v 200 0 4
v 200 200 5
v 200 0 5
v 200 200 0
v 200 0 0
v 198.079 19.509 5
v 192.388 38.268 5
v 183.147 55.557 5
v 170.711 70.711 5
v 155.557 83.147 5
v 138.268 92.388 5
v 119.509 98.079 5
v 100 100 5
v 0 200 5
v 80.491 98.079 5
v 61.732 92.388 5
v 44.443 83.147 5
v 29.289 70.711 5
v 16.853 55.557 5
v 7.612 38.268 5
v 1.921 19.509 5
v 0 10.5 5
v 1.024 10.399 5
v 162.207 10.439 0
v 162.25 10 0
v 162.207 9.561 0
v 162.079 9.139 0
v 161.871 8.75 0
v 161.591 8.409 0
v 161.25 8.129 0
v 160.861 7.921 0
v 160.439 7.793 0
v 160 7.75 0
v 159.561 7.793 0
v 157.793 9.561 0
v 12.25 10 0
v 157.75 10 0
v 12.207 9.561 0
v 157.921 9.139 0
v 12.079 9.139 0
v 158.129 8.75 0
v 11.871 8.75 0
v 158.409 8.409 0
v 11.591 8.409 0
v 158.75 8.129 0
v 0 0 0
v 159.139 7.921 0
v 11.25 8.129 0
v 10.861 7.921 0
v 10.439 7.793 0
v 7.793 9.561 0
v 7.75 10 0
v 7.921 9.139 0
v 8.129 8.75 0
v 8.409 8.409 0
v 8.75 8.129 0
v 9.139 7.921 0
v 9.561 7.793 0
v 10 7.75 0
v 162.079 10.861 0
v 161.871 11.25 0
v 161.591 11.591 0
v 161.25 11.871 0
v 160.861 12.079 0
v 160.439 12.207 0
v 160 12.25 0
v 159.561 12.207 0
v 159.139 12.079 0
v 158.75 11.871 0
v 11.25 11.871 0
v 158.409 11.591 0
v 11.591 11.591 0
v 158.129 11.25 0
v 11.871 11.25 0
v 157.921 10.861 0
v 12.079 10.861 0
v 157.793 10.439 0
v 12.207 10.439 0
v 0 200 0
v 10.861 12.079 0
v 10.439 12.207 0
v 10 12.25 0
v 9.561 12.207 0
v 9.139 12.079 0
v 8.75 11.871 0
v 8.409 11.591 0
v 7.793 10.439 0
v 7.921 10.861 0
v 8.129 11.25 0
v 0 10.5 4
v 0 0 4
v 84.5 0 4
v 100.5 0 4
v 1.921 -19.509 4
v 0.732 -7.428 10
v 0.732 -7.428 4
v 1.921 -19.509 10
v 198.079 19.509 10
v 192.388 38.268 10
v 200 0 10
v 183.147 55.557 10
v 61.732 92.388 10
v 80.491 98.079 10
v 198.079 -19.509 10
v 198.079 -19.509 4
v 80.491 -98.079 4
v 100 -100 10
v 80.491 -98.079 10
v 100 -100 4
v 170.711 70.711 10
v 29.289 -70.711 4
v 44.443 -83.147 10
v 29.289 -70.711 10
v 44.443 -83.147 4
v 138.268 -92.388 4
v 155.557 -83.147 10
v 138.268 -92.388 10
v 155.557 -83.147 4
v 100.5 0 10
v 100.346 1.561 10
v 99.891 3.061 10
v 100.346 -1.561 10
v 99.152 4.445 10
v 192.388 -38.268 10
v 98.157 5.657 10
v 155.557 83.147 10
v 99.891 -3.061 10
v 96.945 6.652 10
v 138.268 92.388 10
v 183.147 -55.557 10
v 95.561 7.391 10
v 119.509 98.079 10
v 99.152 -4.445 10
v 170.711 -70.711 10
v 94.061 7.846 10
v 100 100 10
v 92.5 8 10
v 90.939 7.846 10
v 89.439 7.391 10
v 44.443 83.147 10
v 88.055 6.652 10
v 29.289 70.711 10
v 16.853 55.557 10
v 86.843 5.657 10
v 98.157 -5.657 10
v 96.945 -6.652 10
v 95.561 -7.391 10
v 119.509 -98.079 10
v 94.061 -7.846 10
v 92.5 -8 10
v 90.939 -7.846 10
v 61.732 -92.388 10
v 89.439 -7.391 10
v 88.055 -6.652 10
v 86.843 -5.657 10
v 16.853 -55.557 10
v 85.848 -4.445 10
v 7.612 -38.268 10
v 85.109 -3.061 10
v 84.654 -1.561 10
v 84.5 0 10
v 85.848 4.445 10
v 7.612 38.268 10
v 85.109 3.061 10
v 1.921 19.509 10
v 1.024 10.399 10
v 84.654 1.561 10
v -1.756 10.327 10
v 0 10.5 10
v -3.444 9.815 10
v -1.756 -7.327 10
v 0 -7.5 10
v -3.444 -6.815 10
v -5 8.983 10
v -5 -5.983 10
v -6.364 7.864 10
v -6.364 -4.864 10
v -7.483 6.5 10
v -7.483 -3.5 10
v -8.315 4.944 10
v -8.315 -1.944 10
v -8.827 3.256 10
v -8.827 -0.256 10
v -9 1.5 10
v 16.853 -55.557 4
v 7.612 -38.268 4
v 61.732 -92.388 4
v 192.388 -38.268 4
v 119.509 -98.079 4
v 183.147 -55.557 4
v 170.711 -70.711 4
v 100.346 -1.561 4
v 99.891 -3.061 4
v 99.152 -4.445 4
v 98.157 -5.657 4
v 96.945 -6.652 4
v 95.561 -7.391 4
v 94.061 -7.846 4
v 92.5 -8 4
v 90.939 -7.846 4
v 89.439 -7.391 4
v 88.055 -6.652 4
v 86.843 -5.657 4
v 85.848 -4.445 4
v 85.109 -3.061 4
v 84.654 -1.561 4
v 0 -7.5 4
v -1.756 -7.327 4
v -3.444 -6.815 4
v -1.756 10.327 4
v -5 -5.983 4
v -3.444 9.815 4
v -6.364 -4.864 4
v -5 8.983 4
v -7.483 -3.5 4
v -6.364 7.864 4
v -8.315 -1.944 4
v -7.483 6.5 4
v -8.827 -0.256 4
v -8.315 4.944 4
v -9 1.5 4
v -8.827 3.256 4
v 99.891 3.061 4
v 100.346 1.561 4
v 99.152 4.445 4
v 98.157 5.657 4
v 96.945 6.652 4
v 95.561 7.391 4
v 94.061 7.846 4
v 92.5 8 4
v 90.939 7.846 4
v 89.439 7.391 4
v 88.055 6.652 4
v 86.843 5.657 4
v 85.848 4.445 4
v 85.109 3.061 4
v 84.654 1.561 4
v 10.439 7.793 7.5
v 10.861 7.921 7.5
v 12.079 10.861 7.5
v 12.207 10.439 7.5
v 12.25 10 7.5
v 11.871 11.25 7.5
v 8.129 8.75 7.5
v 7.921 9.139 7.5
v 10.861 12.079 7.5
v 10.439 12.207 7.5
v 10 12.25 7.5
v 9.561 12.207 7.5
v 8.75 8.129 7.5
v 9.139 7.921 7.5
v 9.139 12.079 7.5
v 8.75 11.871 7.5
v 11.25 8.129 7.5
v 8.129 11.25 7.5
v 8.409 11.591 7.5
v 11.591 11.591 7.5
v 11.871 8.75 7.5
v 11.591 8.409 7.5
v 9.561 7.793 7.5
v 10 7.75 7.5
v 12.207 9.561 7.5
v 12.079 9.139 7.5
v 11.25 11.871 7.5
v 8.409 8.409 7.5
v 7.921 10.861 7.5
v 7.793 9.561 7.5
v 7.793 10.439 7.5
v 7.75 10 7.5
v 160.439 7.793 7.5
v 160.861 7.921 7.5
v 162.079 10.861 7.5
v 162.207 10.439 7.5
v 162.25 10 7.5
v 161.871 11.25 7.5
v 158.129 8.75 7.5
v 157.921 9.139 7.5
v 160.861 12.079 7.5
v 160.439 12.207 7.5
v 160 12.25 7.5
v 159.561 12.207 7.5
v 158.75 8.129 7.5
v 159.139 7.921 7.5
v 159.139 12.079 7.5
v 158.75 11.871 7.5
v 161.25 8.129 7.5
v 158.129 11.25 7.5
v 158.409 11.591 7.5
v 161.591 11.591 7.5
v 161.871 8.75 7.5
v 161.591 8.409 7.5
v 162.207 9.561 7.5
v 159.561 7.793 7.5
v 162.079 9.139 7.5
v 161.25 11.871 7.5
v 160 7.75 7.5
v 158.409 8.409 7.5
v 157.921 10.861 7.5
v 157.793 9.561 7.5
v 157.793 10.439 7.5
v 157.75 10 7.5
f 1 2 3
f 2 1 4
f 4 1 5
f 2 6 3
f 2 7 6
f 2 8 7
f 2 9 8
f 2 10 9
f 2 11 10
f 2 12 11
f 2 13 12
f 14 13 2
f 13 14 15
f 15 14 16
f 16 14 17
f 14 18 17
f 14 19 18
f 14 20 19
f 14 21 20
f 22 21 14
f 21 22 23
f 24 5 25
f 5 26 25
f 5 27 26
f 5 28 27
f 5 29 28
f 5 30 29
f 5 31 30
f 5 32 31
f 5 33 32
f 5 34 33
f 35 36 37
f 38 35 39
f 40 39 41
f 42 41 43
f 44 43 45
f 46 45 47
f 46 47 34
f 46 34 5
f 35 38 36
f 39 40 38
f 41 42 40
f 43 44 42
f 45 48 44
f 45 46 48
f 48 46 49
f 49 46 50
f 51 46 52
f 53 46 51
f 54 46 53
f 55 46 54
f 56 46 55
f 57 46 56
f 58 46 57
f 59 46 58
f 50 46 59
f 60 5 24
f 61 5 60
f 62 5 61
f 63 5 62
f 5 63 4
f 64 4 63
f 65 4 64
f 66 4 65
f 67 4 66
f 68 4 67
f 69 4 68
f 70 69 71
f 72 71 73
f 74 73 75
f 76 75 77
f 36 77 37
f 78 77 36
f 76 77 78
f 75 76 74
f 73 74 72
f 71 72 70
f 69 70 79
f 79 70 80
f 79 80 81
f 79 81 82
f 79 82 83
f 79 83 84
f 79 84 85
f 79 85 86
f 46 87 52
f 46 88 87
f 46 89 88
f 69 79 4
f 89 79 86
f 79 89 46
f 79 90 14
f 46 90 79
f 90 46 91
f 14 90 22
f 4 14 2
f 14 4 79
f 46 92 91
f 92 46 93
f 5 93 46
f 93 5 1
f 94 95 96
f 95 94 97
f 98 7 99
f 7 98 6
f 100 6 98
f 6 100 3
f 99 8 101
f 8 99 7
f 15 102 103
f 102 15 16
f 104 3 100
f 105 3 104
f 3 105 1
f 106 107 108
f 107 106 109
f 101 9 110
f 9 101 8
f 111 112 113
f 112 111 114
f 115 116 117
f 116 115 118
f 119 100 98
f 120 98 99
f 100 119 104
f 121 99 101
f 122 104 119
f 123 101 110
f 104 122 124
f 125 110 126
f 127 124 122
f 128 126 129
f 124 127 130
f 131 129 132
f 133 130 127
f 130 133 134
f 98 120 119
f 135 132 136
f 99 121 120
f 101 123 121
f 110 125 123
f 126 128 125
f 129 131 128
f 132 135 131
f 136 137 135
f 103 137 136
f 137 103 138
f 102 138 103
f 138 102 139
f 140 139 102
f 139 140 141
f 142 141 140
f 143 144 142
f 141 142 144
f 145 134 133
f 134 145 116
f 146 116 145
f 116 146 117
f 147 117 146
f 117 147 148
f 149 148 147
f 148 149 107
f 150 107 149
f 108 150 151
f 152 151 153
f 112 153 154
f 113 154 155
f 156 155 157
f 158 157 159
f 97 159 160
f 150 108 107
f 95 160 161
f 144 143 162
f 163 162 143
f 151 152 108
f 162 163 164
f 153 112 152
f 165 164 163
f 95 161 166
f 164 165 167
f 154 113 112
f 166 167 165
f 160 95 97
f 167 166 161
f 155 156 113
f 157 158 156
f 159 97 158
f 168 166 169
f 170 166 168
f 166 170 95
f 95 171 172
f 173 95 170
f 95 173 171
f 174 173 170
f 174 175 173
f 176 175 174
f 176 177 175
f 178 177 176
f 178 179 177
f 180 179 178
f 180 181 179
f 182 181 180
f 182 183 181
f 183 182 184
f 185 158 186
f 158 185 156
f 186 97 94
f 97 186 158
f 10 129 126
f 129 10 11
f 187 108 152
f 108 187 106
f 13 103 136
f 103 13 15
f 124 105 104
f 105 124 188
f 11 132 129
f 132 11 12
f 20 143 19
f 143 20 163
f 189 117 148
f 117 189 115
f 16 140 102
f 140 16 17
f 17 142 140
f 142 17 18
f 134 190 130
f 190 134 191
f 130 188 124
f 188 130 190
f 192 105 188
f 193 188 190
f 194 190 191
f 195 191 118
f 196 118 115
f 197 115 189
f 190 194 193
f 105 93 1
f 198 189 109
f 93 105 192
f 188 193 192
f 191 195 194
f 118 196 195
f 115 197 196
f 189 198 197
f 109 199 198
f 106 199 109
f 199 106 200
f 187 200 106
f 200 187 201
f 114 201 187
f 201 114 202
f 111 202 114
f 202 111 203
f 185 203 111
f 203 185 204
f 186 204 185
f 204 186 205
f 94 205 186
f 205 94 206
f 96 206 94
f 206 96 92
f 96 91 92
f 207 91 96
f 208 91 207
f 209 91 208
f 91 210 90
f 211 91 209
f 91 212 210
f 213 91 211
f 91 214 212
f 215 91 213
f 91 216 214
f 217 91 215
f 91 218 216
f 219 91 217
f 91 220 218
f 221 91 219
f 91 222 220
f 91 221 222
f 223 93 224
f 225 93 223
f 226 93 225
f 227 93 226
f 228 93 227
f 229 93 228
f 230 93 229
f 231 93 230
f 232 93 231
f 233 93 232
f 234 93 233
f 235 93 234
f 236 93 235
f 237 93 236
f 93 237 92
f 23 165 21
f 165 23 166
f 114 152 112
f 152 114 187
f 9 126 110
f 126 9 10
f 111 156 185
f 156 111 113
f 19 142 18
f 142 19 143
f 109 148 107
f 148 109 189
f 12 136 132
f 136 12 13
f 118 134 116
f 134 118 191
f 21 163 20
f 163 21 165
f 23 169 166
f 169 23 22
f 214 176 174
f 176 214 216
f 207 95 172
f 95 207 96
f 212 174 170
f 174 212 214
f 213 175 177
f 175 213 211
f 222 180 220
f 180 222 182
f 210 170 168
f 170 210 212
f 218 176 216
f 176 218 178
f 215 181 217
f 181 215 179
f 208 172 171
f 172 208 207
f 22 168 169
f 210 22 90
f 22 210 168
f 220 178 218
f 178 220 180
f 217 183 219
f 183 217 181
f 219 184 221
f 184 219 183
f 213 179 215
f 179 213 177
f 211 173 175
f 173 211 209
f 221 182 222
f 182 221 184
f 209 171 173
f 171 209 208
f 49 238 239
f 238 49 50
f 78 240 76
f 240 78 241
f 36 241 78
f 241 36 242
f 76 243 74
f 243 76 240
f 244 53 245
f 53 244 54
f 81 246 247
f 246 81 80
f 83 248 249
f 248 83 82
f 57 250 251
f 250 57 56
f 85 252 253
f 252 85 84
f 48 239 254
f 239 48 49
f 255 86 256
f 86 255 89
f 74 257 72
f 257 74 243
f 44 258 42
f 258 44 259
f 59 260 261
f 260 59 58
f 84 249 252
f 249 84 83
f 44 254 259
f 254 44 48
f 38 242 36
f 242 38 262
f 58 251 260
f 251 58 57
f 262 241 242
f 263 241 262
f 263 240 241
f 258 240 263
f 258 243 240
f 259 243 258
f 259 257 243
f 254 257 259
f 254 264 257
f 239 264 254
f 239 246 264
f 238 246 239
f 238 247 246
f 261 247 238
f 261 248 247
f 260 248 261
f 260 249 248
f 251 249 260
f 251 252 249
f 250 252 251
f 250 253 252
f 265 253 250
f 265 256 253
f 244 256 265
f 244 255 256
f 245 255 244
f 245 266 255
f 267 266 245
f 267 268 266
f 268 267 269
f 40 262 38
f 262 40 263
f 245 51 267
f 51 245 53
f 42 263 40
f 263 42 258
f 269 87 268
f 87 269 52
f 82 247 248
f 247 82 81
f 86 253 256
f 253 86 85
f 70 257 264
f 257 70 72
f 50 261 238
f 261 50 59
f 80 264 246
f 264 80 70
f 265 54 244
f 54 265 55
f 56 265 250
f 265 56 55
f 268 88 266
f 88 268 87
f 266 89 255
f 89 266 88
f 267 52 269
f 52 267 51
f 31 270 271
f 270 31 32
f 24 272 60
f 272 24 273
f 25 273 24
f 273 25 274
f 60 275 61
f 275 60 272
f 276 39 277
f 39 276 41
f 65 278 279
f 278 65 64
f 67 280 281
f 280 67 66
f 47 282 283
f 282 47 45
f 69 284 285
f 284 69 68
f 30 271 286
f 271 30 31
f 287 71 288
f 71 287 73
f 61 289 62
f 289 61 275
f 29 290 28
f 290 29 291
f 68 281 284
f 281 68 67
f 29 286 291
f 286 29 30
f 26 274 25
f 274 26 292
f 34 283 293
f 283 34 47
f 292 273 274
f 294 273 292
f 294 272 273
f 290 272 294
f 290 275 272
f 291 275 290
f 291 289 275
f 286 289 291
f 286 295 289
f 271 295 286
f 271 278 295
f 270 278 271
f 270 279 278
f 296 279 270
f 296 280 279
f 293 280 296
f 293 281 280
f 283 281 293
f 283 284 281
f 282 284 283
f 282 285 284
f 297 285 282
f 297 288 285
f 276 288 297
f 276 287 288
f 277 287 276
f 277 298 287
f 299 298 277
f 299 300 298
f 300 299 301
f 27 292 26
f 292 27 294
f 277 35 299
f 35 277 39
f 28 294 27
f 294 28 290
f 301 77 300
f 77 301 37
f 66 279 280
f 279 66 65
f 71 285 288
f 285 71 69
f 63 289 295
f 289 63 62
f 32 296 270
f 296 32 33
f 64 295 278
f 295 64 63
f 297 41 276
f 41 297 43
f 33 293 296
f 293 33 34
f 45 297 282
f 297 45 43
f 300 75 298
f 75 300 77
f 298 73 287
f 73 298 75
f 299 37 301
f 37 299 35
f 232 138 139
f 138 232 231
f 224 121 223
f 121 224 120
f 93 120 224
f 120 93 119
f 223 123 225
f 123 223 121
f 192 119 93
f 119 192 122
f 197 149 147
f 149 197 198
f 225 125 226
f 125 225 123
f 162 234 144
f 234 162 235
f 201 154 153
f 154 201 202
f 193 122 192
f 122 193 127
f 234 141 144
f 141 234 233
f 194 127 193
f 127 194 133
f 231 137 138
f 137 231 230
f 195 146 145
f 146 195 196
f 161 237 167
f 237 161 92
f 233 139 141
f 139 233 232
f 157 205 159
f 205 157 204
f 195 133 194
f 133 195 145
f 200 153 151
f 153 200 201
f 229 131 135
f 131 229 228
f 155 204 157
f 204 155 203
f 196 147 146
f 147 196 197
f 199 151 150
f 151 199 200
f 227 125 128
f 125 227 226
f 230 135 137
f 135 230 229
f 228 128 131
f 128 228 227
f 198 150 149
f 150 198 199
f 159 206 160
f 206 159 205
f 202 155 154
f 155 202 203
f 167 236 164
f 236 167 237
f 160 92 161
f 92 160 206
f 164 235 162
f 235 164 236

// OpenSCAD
$fn = 32;
// ----------------------------------------------------------------------
// Flange: 200 x 200 x 20 mm
// ----------------------------------------------------------------------
// --- parameters (mm) ---
flange_d = 200;           // flange outside diameter
flange_l = 200;           // flange length
flange_t = 5;             // flange thickness
hub_d = 18;               // hub diameter
hub_l = 12;               // hub length
bolt_d = 4.5;             // bolt hole diameter
bolt_n = 16;              // bolt holes per side
bolt_pitch = 16;          // bolt pitch
module hole_z(px, py) {
  translate([px, py, -2.5]) cylinder(h = flange_t + 5, d = bolt_d);
}
module hole_y_pz(pz) {
  /* through both flanges along the y axis, with a 2.5 mm gap in the hub */
  translate([0, -10, pz]) rotate([-90, 0, 0]) cylinder(h = flange_t + 20, d = bolt_d);
}
module base() {
  cube([flange_l, flange_d, flange_t]);
}
module flange() {
  translate([flange_l / 2, 0, flange_t - 1])
    cylinder(h = flange_t + 1, d = flange_d);
}
module hub() {
  translate([0, flange_t / 2 - 1, flange_t * 0.8])
    cylinder(h = flange_t * 0.8 + 2, d = hub_d);
}
difference() {
  union() {
    base();
    flange();
    hub();
  }
  hole_z(10, 10);
  hole_z(160, 10);
  /* through both flanges, 1.5 mm clear of the edges */
  translate([flange_l / 2 - 7.5, 0, flange_t * 0.8])
    cylinder(h = flange_t + 20, d = bolt_pitch);
}
